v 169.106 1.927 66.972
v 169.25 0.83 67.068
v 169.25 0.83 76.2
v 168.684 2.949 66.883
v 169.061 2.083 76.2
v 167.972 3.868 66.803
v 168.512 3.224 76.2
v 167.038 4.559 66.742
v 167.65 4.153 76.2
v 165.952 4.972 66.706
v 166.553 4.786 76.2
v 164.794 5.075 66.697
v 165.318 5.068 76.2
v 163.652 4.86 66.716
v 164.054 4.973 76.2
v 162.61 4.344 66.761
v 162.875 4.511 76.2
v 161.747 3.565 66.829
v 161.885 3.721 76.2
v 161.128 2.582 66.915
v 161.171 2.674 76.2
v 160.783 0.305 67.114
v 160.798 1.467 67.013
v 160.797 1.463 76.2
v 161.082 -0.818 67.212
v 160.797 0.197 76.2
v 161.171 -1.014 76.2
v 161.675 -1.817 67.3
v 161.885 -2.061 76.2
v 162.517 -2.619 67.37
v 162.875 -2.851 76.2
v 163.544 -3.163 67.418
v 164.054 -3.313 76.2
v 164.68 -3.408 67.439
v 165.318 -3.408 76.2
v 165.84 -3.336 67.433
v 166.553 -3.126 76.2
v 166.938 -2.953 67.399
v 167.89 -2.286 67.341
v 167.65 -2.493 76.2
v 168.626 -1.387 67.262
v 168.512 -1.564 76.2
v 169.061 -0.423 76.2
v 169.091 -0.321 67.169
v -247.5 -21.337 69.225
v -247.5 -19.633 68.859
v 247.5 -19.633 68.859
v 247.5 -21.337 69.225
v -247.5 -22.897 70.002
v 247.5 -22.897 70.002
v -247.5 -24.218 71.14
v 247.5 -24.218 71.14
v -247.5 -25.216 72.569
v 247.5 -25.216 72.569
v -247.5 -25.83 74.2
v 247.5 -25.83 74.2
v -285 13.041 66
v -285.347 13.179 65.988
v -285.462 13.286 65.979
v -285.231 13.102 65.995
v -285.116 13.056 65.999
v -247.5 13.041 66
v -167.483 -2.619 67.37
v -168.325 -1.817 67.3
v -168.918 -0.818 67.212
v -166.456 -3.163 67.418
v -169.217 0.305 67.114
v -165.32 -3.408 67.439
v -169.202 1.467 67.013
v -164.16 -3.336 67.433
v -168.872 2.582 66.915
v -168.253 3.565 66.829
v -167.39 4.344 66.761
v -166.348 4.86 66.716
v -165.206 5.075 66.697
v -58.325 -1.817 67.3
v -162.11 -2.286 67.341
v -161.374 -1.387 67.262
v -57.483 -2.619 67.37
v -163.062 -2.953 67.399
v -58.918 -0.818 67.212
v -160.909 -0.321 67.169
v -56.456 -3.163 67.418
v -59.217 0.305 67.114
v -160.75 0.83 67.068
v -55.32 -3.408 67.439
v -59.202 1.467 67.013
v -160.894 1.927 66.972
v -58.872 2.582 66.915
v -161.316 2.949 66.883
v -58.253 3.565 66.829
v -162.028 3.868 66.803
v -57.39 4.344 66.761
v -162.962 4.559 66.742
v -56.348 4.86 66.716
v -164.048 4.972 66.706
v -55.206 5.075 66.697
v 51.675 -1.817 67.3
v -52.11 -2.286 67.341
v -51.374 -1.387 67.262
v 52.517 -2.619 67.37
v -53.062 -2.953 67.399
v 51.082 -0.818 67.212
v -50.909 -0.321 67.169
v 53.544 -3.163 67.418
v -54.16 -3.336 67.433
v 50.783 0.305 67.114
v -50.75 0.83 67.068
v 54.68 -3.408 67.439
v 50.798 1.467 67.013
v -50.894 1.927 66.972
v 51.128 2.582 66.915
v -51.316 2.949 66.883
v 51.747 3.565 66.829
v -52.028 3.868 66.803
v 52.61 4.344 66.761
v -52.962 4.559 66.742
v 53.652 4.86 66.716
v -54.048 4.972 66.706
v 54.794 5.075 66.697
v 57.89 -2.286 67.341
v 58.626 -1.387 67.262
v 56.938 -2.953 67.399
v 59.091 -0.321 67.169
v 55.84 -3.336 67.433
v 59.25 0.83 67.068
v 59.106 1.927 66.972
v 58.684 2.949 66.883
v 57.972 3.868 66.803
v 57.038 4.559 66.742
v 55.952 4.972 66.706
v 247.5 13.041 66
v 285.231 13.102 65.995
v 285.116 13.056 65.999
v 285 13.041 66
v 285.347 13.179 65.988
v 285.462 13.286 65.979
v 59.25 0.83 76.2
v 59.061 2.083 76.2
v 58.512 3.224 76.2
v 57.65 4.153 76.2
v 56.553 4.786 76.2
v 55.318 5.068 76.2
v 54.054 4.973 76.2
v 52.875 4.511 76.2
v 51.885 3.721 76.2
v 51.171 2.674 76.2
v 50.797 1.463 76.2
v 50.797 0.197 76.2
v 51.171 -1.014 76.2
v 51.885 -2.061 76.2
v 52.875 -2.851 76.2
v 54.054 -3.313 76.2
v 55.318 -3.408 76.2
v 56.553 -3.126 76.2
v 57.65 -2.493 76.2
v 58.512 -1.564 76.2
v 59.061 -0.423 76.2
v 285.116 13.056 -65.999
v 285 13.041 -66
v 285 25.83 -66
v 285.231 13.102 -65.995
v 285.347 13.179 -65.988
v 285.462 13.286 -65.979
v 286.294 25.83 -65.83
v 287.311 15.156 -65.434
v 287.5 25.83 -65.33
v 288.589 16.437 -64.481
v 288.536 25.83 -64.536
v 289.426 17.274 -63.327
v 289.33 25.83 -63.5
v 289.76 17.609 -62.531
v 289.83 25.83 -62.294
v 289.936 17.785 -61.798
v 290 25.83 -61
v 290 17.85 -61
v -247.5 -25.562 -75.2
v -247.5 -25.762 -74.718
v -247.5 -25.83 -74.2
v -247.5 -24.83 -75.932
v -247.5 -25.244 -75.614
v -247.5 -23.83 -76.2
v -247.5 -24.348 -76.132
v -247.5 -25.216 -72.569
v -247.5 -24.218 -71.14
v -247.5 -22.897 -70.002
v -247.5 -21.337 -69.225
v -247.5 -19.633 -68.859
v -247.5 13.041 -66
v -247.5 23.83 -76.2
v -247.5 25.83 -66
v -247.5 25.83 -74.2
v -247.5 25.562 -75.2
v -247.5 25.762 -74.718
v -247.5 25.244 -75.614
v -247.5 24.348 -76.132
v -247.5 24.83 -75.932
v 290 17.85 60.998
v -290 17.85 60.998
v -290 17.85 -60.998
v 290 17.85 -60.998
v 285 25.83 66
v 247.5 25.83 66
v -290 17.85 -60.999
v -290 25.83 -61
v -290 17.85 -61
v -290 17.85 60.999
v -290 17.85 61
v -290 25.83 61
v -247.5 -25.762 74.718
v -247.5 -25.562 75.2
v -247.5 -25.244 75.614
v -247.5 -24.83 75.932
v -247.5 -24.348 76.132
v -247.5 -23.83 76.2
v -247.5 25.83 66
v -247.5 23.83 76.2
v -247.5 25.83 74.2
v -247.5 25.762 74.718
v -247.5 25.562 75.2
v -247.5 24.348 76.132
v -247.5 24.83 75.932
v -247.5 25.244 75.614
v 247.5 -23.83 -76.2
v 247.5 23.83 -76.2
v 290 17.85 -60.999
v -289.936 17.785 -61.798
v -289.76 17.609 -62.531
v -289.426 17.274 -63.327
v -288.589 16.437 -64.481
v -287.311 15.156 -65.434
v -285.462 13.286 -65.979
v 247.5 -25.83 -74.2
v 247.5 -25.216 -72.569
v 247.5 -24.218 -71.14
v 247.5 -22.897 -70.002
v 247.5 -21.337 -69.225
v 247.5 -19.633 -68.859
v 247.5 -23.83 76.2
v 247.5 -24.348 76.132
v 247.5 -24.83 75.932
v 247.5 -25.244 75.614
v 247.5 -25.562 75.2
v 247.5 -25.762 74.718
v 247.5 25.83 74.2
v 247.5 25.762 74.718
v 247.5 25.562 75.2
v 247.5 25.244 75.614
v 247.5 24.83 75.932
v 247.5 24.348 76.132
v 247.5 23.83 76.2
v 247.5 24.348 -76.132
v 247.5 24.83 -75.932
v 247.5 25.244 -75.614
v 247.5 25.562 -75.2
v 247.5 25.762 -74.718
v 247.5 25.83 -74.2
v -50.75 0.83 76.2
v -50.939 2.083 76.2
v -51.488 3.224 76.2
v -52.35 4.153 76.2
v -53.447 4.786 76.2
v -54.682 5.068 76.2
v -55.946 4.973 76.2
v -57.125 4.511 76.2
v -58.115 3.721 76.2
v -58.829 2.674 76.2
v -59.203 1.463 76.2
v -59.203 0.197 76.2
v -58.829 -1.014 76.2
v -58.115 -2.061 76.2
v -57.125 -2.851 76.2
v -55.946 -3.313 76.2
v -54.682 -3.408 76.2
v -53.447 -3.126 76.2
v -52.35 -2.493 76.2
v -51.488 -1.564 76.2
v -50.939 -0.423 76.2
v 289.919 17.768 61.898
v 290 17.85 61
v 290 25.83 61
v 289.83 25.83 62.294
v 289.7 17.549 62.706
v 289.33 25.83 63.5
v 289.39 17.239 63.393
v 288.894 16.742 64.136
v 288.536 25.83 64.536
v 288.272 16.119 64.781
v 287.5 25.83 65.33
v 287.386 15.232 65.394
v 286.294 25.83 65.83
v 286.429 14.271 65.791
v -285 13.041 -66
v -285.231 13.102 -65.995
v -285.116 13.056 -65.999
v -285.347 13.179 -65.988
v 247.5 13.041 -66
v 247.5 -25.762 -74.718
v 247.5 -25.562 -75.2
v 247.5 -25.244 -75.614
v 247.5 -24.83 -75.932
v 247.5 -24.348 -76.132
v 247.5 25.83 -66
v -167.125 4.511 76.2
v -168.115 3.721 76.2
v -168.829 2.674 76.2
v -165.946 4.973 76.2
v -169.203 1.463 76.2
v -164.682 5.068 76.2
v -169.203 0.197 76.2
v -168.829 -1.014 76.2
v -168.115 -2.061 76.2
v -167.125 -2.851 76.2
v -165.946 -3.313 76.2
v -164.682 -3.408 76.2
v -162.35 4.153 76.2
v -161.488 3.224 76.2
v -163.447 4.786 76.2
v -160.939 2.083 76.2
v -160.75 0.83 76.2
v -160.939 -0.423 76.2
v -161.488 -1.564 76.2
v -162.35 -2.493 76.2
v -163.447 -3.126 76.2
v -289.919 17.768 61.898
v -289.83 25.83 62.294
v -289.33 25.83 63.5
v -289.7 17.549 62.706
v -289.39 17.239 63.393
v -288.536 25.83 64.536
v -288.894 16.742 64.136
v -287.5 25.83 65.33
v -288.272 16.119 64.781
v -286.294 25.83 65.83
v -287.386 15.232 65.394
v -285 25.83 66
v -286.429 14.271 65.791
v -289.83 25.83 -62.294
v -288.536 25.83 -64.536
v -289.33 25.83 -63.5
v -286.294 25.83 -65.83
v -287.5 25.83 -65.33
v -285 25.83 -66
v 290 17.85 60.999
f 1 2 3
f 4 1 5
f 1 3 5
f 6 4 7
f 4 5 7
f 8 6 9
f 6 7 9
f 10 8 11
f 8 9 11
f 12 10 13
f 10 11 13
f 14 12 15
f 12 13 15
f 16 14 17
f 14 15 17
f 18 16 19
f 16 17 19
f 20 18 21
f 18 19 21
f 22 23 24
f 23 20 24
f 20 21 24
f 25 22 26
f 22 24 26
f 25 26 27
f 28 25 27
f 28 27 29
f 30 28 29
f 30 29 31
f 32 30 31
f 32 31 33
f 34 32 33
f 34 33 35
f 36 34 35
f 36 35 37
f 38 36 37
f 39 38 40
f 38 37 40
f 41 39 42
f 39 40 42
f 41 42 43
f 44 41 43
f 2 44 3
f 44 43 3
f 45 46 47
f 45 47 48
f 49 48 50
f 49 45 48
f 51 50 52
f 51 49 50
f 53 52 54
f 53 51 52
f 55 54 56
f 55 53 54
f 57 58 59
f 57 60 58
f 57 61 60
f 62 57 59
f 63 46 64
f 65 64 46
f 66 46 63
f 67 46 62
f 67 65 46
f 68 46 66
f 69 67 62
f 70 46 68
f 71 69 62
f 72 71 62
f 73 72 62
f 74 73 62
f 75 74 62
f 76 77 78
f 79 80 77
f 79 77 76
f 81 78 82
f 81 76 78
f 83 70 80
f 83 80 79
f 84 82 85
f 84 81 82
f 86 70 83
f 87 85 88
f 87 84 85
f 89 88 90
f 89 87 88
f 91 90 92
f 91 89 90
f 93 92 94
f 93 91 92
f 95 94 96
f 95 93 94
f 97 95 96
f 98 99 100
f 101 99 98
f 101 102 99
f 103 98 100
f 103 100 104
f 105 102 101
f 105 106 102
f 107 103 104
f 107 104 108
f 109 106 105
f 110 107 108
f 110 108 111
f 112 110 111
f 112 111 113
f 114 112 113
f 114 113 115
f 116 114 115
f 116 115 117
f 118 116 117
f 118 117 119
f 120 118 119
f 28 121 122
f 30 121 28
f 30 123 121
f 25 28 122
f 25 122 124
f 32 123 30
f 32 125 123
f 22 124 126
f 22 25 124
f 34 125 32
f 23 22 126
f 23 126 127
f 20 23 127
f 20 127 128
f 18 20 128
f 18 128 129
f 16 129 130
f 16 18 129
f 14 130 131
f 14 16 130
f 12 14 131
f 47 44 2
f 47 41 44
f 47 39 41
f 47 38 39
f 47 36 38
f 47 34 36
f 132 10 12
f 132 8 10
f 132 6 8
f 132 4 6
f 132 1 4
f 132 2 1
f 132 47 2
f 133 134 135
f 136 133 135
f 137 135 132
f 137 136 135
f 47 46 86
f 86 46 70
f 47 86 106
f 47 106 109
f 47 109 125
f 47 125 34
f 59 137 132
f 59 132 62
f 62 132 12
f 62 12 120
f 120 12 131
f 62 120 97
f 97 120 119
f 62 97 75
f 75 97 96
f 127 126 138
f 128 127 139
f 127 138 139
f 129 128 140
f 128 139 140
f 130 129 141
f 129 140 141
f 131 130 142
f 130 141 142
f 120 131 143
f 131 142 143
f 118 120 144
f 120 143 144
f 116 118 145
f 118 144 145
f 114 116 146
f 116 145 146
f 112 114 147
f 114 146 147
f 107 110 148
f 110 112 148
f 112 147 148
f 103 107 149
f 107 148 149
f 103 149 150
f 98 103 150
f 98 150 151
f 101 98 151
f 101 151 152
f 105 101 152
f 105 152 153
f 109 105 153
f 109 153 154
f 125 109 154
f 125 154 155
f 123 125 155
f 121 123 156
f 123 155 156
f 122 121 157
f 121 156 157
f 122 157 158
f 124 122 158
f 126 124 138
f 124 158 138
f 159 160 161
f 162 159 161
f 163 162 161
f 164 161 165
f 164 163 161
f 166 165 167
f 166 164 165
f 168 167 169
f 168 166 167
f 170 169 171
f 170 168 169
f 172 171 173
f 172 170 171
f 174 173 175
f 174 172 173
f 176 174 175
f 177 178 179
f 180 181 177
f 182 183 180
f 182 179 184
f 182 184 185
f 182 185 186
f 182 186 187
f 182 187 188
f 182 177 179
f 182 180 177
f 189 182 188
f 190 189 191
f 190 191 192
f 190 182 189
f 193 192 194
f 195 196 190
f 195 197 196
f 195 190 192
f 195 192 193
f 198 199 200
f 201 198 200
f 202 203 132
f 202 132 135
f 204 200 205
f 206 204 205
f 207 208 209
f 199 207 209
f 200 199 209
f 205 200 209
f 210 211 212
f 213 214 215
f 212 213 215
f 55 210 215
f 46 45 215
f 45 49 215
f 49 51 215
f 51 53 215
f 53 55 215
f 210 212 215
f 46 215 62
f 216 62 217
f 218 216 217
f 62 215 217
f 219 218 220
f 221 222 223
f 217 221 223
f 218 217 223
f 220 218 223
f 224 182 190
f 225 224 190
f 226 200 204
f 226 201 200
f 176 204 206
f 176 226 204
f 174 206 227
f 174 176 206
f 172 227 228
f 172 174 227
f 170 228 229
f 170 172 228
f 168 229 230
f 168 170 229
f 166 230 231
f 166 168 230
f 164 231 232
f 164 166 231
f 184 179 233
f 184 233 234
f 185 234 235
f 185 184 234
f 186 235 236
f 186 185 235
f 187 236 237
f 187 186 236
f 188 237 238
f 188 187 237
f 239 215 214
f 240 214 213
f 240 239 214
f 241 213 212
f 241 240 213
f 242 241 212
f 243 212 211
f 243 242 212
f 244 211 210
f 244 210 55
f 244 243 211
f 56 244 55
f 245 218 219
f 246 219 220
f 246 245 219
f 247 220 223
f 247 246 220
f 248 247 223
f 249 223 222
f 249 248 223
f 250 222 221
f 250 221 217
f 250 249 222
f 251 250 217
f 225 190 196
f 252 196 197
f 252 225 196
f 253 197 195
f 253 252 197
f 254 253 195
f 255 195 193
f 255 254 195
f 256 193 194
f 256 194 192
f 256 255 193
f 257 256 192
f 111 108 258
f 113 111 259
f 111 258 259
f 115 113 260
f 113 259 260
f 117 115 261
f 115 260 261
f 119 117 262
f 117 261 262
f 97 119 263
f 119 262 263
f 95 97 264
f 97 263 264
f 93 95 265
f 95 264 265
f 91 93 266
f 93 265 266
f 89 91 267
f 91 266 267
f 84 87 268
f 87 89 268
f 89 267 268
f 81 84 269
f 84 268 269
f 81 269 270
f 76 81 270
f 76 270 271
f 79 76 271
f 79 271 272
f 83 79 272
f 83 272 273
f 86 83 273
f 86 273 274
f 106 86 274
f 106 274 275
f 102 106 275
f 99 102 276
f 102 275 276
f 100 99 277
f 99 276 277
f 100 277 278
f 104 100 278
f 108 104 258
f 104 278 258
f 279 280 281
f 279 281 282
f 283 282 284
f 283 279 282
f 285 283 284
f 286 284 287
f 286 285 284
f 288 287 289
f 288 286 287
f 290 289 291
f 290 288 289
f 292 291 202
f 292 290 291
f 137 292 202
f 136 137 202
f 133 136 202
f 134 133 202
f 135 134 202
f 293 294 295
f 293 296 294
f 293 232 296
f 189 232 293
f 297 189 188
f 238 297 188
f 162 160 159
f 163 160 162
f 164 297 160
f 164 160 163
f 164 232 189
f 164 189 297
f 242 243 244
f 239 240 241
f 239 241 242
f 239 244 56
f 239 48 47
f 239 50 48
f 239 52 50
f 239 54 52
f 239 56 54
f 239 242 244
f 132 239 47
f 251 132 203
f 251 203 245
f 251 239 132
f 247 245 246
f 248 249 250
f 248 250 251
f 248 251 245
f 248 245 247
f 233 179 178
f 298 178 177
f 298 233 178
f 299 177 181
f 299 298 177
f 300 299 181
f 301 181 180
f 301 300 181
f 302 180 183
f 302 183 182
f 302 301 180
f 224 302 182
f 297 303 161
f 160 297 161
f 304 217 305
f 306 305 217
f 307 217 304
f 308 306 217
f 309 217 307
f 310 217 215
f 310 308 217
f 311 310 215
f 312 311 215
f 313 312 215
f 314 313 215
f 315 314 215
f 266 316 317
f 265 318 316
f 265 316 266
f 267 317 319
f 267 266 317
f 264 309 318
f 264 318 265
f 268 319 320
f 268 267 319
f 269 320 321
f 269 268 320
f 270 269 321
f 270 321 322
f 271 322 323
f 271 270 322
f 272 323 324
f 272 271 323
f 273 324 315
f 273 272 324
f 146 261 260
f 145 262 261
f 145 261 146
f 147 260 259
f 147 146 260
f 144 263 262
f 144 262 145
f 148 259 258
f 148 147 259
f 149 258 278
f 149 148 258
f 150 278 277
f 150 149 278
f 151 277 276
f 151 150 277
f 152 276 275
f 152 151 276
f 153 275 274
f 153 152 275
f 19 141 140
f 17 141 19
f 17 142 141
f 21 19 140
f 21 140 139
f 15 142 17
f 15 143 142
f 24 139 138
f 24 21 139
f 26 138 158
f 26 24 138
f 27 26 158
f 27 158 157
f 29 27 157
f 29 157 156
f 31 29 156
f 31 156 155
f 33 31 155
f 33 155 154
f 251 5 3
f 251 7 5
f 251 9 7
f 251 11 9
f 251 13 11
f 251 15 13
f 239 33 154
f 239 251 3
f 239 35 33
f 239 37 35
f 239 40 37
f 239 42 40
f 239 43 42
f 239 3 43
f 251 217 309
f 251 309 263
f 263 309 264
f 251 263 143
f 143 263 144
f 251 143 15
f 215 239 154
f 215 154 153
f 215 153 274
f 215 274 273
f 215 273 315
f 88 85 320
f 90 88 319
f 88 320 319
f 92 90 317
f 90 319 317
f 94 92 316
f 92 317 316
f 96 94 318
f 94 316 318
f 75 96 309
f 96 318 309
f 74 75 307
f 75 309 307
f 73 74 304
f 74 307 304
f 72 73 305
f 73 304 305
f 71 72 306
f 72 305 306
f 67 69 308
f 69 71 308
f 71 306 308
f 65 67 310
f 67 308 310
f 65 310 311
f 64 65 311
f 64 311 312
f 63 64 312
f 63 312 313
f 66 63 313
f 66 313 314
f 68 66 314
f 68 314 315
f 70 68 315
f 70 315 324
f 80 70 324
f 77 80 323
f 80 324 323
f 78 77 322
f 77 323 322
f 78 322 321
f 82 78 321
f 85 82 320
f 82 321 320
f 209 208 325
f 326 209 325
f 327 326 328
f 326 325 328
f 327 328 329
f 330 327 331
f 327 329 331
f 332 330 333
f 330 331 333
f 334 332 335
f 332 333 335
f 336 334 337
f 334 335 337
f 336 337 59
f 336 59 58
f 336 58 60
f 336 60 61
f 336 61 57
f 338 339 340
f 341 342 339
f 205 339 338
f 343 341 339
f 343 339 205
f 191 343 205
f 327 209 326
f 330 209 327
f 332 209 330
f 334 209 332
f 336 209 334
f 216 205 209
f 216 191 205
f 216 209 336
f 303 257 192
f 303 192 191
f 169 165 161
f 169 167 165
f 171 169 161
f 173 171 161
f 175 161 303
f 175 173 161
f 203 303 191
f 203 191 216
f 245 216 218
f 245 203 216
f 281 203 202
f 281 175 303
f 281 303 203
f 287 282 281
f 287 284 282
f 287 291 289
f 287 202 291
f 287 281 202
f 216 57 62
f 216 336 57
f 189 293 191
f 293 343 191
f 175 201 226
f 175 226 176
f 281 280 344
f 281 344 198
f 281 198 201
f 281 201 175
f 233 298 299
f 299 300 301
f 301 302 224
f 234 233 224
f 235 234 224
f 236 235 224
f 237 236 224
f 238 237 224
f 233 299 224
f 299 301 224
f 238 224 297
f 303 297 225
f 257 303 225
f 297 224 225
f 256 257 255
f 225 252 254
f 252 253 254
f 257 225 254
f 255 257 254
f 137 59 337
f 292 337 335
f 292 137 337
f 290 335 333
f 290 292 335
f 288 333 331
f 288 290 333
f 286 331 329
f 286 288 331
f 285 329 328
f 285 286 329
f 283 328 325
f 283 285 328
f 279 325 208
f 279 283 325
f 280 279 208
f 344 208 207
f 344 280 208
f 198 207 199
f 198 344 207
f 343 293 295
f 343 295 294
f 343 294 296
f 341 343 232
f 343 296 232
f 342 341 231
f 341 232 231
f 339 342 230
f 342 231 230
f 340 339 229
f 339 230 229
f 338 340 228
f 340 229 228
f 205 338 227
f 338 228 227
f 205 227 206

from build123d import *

# Parameters (mm, degrees)
F1_DEPTH    = 290
F2_T1_DEPTH = 611.1034588044
F3_R        = 4.25
F4_DEPTH    = 25
F5_W        = 60
F5_H        = 130.8605410159
F6_DEPTH    = 10.2
F7_R        = 5


# Not quite as in the source:
# - a fillet or chamfer that OpenCascade refuses, or shapes differently, is made with other operations: its cross-section is extruded or revolved along the edge and cut away or added
# - a pattern or mirror of a feature is missing from the dataset's text; its kind, count and spacing are read off the source's solid


with BuildPart() as f1:
    # F0 (on Right) → F1 (new body, symmetric)
    with BuildSketch(Plane.YZ):
        with BuildLine():
            ThreePointArc((-25.83, -74.2), (-25.2442135624, -75.6142135624), (-23.83, -76.2))
            Line((-23.83, -76.2), (23.83, -76.2))
            ThreePointArc((23.83, -76.2), (25.2442135624, -75.6142135624), (25.83, -74.2))
            Line((25.83, -74.2), (25.83, 74.2))
            ThreePointArc((25.83, 74.2), (25.2442135624, 75.6142135624), (23.83, 76.2))
            Line((23.83, 76.2), (-23.83, 76.2))
            ThreePointArc((-23.83, 76.2), (-25.2442135624, 75.6142135624), (-25.83, 74.2))
            Line((-25.83, 74.2), (-25.83, 69.4007524114))
            Line((-25.83, 69.4007524114), (13.2857787137, 65.978565209))
            ThreePointArc((13.2857787137, 65.978565209), (16.5363866841, 64.3755427566), (17.85, 60.9975917185))
            Line((17.85, 60.9975917185), (17.85, -60.9975917185))
            ThreePointArc((17.85, -60.9975917185), (16.5363866841, -64.3755427566), (13.2857787137, -65.978565209))
            Line((13.2857787137, -65.978565209), (-25.83, -69.4007524114))
            Line((-25.83, -69.4007524114), (-25.83, -74.2))
        make_face()
    extrude(amount=F1_DEPTH, both=True)

    # F2: fillet of radius 7 on 2 edges, made by hand

    # F2_s2 → F2_t1 (cut)
    with BuildSketch(Plane.YZ.offset(-305.5517294022)):
        with BuildLine():
            ThreePointArc((-25.83, -74.2), (-23.5930536317, -70.5297202282), (-19.6329798493, -68.8585834006))
            Line((-19.6329798493, -68.8585834006), (-19.6451816533, -68.7191161428))
            Line((-19.6451816533, -68.7191161428), (-25.842201804, -69.2612851537))
            Line((-25.842201804, -69.2612851537), (-25.97, -69.4007524114))
            ThreePointArc((-25.97, -69.4007524114), (-25.97, -71.8003762057), (-25.966142207, -74.1673610743))
            Line((-25.966142207, -74.1673610743), (-25.83, -74.2))
        make_face()
        with BuildLine():
            ThreePointArc((-19.6329798493, 68.8585834006), (-23.5930536317, 70.5297202282), (-25.83, 74.2))
            Line((-25.83, 74.2), (-25.966142207, 74.1673610743))
            ThreePointArc((-25.966142207, 74.1673610743), (-25.97, 71.8003762057), (-25.97, 69.4007524114))
            Line((-25.97, 69.4007524114), (-25.842201804, 69.2612851537))
            Line((-25.842201804, 69.2612851537), (-19.6451816533, 68.7191161428))
            Line((-19.6451816533, 68.7191161428), (-19.6329798493, 68.8585834006))
        make_face()
    extrude(amount=F2_T1_DEPTH, mode=Mode.SUBTRACT)

    # F3 (on face) → F4 (cut)
    with BuildSketch(Plane.XY.offset(76.2)):
        with Locations((-275, 0.83)):
            Circle(F3_R)
        with Locations((-165, 0.83)):
            Circle(F3_R)
        with Locations((-55, 0.83)):
            Circle(F3_R)
        with Locations((55, 0.83)):
            Circle(F3_R)
        with Locations((165, 0.83)):
            Circle(F3_R)
        with Locations((275, 0.83)):
            Circle(F3_R)
    extrude(amount=-F4_DEPTH, mode=Mode.SUBTRACT)

    # F5 (on face) → F6 (cut)
    with BuildSketch(Plane.XY.offset(76.2)):
        with Locations((-277.5, 8.7228175253)):
            Rectangle(F5_W, F5_H)
        with Locations((277.5, 8.7228175253)):
            Rectangle(F5_W, F5_H)
    f6 = extrude(amount=-F6_DEPTH, mode=Mode.SUBTRACT)

    # F6_copies: F6 across plane
    add(f6.mirror(Plane(origin=(0, 0, 0), x_dir=(-1, 0, 0), z_dir=(0, 0, -1))), mode=Mode.SUBTRACT)

    # F7
    f7_edges = [f1.edges().sort_by_distance(p)[0] for p in [
        (-290, 19.435389, 66),
        (290, 19.435389, 66),
        (290, 19.435389, -66),
        (-290, 19.435389, -66),
    ]]
    fillet(f7_edges, radius=F7_R)


solid = f1.part
